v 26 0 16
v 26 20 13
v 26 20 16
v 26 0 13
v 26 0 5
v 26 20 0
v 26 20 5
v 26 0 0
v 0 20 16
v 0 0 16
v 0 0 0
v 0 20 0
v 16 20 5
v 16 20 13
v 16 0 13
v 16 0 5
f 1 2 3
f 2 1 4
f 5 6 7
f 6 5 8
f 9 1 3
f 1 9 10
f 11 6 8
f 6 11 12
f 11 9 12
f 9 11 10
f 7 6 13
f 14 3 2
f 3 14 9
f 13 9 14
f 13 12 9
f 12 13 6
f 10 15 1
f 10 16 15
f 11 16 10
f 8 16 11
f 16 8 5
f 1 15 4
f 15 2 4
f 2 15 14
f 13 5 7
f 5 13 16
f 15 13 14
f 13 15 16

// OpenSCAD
//--------------------------------------------------------------
// Name: rf_shelv_holder.scad
// Version: 0.5
// Purpose: Refrigirator shelv holder
// Author: Evgeny Klepikov
// E-mail: klek07@ya.ru
//
// Created: 05.03.2018
// Updated: 05.03.2018
// Copyright: (c) 2018 WildFox24
// Licence: GPL v3
//--------------------------------------------------------------
//
Ws=5;
Ht=8;
Wx=16;
Dc=21;
$fn=100;
module RFShelvHolder() {
    difference() {
        translate([0,0,0]) cube([Wx+10,20,Ht+Ws+3], false);
        translate([16,0,Ws]) cube([16,20,8], false);
    }
}
module ScrewHole(hx,hy,hz) {
  translate([hx,hy-hy-1,hz]) rotate([-90,0,0]) cylinder(d1=10, d2=4, h=2);
  translate([hx,hy,hz]) rotate([90,0,0]) cylinder(d=4, h=Ws+10);
}
difference() {
  RFShelvHolder();
  //ScrewHole(7,10,30);
  //ScrewHole(43,10,30);
}
